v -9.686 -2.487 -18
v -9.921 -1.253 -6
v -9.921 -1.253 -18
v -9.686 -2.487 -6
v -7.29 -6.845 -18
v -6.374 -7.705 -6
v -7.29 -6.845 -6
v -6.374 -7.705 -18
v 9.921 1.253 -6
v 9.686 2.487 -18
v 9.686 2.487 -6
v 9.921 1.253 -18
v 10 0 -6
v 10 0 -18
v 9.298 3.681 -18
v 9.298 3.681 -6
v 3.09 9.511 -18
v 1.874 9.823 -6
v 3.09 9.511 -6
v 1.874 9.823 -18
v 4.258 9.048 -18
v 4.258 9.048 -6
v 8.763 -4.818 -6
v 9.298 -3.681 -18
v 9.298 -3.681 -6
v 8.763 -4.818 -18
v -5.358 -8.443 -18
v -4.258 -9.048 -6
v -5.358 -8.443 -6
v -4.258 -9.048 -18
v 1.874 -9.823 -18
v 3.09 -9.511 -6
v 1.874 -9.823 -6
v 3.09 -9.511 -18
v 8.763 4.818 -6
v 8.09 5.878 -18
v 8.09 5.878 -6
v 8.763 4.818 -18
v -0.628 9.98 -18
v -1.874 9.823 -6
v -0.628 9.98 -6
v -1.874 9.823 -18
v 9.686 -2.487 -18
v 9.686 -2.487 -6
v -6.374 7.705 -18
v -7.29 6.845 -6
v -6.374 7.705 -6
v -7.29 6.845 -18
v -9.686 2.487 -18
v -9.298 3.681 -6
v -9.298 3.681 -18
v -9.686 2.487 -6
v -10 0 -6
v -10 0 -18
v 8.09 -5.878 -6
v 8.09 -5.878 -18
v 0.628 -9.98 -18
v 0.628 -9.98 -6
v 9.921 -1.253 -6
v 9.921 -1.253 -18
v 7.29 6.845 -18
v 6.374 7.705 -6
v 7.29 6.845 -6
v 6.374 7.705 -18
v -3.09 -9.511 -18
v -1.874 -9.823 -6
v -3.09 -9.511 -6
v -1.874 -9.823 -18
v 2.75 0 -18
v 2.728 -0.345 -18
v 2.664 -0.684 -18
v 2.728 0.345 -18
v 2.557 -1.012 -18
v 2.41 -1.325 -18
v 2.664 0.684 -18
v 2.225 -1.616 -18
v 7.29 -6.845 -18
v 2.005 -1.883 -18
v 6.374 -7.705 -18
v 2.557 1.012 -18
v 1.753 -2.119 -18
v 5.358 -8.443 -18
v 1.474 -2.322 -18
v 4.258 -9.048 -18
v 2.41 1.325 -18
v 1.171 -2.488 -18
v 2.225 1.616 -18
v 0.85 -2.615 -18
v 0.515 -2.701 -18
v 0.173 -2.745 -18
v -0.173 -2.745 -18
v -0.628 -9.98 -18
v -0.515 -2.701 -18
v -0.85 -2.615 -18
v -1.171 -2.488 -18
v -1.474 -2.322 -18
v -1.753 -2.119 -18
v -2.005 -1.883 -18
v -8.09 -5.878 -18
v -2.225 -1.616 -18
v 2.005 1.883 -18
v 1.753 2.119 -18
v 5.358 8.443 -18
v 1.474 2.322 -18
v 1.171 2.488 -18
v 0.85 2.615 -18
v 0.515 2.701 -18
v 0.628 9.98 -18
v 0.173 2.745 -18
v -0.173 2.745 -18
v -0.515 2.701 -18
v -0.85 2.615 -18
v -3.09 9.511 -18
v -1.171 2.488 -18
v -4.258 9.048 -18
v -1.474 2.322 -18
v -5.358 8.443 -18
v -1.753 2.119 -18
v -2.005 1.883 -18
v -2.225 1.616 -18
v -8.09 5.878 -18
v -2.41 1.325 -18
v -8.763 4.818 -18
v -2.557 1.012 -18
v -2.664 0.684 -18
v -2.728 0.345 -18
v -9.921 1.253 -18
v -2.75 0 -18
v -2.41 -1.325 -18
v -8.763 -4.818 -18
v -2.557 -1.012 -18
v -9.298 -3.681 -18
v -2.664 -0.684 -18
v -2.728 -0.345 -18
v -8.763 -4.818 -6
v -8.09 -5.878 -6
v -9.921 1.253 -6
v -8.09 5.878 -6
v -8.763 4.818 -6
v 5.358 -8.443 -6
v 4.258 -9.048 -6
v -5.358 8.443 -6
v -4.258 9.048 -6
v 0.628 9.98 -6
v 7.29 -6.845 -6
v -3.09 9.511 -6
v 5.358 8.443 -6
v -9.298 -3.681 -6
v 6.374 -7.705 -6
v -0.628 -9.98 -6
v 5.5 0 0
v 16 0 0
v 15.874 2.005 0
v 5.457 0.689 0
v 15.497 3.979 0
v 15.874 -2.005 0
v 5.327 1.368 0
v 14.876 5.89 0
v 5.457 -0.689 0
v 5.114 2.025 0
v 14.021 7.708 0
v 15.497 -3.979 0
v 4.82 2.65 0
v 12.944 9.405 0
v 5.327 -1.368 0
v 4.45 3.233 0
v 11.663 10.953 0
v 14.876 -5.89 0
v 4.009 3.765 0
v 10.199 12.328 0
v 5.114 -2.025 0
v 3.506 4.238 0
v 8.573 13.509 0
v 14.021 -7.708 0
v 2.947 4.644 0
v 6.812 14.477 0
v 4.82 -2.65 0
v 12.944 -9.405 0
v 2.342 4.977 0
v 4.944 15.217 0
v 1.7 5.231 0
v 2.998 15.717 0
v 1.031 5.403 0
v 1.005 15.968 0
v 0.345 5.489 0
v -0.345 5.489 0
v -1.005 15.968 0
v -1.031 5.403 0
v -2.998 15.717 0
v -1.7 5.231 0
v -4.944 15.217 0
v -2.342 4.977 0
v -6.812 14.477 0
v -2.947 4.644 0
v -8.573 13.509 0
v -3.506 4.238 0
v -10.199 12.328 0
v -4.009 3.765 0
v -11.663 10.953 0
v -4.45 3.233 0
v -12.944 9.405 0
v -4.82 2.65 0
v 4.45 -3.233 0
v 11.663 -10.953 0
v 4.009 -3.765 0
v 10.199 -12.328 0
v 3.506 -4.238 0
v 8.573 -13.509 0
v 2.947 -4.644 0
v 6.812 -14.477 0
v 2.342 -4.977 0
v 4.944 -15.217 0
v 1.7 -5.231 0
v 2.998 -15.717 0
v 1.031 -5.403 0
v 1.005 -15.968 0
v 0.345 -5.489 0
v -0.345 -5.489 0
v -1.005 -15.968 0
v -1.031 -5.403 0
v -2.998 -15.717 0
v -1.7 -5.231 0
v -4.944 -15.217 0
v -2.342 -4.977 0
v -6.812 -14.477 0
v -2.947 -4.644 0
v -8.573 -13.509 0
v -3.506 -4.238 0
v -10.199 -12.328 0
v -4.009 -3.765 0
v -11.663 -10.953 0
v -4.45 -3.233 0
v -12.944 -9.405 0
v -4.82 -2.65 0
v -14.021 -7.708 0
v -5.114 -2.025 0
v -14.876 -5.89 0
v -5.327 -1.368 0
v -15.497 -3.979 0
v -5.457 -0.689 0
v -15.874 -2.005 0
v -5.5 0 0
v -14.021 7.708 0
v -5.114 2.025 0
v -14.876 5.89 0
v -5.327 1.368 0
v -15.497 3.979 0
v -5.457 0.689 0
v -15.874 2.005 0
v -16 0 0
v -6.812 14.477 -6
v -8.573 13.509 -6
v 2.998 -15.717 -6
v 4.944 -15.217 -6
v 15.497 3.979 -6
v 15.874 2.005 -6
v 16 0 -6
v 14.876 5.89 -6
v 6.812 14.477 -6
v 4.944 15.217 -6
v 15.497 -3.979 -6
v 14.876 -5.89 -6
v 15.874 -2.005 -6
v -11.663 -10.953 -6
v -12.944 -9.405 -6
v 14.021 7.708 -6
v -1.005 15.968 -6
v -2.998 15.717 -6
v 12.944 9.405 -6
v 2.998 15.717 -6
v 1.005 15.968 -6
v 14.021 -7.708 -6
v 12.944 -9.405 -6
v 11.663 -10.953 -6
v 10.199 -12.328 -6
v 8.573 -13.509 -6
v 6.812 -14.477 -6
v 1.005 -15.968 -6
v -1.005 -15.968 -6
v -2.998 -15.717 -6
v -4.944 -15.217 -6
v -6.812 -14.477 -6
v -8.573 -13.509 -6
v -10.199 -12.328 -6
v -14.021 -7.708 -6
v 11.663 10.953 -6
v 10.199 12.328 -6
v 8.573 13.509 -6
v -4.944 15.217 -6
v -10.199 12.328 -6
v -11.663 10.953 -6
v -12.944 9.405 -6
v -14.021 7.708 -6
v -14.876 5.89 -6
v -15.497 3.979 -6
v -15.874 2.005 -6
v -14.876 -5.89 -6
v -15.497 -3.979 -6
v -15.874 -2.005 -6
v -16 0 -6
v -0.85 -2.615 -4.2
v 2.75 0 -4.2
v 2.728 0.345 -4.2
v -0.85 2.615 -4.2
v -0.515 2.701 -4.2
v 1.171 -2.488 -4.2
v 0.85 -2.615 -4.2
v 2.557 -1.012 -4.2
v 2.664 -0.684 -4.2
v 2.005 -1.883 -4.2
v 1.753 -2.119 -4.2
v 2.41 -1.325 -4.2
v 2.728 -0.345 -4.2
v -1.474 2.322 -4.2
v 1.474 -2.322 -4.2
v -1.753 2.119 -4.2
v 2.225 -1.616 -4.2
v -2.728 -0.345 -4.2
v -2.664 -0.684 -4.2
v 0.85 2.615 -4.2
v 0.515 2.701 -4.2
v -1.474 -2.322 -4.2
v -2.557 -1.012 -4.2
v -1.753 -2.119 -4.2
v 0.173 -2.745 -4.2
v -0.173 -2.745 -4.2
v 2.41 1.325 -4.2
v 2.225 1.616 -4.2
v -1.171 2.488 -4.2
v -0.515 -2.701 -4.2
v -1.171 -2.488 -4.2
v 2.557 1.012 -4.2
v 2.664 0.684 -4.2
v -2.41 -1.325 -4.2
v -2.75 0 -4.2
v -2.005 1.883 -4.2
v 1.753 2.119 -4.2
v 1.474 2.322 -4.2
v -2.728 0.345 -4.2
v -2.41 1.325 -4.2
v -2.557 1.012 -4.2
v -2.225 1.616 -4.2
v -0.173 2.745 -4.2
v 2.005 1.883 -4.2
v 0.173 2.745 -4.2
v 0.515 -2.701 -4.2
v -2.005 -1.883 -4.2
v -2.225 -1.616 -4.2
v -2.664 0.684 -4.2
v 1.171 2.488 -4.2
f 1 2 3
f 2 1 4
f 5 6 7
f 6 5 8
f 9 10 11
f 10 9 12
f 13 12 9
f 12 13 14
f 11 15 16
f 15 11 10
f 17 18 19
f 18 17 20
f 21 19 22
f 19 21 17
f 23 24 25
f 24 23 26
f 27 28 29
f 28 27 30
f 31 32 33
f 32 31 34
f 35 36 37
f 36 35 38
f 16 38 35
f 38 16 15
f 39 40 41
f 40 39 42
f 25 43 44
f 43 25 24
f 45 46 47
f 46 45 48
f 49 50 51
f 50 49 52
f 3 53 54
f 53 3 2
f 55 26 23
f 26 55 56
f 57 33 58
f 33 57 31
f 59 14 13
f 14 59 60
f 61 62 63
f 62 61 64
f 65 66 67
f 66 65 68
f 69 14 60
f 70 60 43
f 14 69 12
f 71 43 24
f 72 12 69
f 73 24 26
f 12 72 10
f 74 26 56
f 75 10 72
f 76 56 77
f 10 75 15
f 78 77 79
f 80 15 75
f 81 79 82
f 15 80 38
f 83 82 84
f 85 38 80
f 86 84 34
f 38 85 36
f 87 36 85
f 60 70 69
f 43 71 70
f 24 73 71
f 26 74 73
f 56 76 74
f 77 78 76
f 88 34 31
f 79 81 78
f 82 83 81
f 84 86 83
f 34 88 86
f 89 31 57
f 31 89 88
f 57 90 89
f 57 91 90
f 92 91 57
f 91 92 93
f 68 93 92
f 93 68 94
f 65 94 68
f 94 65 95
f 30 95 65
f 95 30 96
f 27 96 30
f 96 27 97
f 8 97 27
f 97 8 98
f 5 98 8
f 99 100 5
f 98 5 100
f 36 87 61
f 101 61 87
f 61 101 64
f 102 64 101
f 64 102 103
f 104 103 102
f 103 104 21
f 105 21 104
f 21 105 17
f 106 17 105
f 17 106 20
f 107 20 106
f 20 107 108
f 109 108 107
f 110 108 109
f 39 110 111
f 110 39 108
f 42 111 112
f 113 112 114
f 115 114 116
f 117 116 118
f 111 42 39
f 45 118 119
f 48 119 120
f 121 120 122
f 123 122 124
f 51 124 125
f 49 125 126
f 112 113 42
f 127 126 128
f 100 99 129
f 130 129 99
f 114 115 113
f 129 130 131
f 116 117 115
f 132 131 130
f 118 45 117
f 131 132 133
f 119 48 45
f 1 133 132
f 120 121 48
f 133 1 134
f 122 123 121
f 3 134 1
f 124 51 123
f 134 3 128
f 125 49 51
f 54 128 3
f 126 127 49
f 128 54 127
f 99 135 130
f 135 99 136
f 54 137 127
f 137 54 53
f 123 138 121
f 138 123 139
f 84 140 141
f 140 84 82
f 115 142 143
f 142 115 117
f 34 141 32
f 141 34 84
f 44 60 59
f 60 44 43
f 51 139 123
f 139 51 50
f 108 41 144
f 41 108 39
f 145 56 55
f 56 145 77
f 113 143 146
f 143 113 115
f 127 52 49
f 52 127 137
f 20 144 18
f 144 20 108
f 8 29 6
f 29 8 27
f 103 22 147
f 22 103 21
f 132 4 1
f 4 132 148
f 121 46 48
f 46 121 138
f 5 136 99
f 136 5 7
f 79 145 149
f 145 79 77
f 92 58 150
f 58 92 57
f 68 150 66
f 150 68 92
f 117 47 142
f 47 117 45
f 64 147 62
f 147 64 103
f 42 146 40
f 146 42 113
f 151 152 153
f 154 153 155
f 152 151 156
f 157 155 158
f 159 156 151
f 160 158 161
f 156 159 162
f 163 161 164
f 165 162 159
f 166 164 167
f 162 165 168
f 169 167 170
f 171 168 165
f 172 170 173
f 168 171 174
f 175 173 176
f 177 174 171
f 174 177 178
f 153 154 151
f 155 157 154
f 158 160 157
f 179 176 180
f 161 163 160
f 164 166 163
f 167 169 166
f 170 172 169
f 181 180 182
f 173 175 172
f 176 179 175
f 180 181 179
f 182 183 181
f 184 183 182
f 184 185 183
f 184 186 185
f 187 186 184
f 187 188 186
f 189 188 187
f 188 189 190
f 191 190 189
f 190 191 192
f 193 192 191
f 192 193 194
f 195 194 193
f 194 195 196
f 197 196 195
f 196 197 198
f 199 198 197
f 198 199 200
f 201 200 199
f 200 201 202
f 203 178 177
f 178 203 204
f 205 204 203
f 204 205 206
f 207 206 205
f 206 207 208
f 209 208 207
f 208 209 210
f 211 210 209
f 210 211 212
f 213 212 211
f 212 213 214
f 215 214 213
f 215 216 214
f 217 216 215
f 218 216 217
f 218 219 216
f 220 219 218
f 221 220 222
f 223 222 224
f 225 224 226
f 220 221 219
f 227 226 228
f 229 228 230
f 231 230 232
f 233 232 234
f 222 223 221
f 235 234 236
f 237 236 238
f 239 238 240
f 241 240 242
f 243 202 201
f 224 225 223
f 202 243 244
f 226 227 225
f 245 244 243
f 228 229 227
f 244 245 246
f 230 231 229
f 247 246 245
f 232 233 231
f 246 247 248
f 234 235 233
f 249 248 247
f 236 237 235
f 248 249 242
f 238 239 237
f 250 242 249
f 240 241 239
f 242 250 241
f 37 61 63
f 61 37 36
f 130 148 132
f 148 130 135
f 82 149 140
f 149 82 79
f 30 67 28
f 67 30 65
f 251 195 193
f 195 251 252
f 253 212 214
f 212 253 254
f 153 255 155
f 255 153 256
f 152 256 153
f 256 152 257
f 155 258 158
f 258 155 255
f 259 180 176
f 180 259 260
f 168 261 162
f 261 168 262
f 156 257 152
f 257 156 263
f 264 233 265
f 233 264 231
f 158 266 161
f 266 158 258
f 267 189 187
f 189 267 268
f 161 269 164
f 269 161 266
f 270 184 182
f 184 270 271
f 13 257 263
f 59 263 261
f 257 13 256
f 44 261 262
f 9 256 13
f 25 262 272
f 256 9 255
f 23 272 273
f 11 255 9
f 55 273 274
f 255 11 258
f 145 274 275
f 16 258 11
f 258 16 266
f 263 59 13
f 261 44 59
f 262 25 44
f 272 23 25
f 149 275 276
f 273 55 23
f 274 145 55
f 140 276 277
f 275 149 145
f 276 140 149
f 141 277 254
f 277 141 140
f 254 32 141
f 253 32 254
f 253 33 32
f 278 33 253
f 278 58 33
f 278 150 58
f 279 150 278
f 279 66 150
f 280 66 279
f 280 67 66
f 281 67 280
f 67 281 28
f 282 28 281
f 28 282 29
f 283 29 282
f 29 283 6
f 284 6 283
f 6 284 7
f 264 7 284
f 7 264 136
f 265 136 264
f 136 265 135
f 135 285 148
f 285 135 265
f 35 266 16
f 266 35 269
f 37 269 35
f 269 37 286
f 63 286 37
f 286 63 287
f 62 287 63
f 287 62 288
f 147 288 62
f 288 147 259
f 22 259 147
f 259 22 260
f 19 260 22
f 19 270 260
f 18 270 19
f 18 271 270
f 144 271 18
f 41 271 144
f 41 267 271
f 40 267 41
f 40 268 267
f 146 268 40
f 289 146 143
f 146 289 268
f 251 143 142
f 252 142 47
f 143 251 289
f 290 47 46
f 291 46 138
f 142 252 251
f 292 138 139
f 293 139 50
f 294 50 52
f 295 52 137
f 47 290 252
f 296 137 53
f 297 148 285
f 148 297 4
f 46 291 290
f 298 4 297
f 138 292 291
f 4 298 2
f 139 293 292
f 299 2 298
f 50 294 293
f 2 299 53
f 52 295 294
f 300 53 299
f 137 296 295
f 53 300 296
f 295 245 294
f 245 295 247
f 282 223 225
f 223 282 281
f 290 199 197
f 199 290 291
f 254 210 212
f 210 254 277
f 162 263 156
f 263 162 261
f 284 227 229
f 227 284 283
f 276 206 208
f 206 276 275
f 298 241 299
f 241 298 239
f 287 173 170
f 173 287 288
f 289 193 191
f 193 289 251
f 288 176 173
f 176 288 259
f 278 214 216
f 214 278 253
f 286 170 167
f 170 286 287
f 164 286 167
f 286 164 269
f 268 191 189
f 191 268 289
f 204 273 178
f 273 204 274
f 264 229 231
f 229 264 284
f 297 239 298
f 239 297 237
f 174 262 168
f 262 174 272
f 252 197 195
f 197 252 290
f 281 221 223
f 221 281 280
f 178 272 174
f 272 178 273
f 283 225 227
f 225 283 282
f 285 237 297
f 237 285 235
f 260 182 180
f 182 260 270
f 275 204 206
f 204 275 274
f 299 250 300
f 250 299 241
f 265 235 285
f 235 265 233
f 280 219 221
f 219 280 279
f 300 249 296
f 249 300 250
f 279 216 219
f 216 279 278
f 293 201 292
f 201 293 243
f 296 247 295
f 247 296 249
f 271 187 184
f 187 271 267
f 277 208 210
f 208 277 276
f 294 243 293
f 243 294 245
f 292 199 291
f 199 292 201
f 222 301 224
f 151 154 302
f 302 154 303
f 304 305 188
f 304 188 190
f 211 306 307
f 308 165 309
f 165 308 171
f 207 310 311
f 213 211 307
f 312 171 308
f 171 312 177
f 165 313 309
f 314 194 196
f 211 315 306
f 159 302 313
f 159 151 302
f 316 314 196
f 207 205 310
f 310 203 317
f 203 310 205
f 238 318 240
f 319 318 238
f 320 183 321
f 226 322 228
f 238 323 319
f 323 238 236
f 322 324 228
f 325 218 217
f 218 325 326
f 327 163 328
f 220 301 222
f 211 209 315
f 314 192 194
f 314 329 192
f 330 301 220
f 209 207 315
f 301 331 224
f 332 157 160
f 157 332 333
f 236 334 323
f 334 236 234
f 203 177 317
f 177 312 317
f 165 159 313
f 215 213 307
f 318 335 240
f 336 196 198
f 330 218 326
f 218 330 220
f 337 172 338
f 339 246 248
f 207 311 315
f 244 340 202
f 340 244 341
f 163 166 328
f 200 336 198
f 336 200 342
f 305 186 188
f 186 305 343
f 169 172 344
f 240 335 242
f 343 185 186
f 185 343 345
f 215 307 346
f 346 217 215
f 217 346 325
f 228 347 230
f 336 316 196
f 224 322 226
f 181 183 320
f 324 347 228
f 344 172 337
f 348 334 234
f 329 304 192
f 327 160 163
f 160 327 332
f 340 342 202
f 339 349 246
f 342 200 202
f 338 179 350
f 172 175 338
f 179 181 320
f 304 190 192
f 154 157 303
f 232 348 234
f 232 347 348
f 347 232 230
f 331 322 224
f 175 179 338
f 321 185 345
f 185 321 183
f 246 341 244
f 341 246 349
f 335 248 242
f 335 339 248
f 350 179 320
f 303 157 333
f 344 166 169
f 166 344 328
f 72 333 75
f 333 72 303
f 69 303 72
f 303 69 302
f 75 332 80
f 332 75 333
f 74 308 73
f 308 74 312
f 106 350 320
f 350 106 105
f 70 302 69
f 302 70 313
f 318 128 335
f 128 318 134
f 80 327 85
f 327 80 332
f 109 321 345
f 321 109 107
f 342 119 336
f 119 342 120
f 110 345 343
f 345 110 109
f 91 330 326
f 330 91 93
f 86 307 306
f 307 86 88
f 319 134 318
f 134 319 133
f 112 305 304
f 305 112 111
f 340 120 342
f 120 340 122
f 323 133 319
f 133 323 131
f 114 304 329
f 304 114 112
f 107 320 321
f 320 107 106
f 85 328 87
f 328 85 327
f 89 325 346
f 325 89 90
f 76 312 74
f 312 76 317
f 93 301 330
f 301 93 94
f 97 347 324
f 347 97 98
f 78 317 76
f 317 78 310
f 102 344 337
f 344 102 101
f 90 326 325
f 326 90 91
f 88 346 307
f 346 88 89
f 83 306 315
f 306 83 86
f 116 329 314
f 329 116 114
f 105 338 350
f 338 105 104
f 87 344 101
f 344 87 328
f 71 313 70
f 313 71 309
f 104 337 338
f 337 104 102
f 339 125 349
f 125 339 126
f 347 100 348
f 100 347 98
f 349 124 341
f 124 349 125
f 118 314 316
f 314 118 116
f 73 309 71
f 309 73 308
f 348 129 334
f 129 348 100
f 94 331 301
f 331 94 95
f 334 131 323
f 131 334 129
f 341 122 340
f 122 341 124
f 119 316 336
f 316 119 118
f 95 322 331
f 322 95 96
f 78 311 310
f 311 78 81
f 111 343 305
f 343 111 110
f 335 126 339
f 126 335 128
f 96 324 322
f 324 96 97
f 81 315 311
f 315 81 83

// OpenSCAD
$fn = 50;


difference() {
	union() {
		translate(v = [0, 0, -18.0000000000]) {
			cylinder(h = 18, r = 10.0000000000);
		}
		translate(v = [0, 0, -6.0000000000]) {
			cylinder(h = 6, r = 16.0000000000);
		}
	}
	union() {
		translate(v = [0, 0, 0]) {
			rotate(a = [0, 0, 0]) {
				difference() {
					union() {
						#translate(v = [0, 0, -18.0000000000]) {
							cylinder(h = 18, r = 2.2500000000);
						}
						#translate(v = [0, 0, -4.2000000000]) {
							cylinder(h = 4.2000000000, r = 10.0000000000, r1 = 2.7500000000, r2 = 5.5000000000);
						}
						#translate(v = [0, 0, -18.0000000000]) {
							cylinder(h = 18, r = 2.7500000000);
						}
						#translate(v = [0, 0, -18.0000000000]) {
							cylinder(h = 18, r = 2.2500000000);
						}
					}
					union();
				}
			}
		}
	}
}
